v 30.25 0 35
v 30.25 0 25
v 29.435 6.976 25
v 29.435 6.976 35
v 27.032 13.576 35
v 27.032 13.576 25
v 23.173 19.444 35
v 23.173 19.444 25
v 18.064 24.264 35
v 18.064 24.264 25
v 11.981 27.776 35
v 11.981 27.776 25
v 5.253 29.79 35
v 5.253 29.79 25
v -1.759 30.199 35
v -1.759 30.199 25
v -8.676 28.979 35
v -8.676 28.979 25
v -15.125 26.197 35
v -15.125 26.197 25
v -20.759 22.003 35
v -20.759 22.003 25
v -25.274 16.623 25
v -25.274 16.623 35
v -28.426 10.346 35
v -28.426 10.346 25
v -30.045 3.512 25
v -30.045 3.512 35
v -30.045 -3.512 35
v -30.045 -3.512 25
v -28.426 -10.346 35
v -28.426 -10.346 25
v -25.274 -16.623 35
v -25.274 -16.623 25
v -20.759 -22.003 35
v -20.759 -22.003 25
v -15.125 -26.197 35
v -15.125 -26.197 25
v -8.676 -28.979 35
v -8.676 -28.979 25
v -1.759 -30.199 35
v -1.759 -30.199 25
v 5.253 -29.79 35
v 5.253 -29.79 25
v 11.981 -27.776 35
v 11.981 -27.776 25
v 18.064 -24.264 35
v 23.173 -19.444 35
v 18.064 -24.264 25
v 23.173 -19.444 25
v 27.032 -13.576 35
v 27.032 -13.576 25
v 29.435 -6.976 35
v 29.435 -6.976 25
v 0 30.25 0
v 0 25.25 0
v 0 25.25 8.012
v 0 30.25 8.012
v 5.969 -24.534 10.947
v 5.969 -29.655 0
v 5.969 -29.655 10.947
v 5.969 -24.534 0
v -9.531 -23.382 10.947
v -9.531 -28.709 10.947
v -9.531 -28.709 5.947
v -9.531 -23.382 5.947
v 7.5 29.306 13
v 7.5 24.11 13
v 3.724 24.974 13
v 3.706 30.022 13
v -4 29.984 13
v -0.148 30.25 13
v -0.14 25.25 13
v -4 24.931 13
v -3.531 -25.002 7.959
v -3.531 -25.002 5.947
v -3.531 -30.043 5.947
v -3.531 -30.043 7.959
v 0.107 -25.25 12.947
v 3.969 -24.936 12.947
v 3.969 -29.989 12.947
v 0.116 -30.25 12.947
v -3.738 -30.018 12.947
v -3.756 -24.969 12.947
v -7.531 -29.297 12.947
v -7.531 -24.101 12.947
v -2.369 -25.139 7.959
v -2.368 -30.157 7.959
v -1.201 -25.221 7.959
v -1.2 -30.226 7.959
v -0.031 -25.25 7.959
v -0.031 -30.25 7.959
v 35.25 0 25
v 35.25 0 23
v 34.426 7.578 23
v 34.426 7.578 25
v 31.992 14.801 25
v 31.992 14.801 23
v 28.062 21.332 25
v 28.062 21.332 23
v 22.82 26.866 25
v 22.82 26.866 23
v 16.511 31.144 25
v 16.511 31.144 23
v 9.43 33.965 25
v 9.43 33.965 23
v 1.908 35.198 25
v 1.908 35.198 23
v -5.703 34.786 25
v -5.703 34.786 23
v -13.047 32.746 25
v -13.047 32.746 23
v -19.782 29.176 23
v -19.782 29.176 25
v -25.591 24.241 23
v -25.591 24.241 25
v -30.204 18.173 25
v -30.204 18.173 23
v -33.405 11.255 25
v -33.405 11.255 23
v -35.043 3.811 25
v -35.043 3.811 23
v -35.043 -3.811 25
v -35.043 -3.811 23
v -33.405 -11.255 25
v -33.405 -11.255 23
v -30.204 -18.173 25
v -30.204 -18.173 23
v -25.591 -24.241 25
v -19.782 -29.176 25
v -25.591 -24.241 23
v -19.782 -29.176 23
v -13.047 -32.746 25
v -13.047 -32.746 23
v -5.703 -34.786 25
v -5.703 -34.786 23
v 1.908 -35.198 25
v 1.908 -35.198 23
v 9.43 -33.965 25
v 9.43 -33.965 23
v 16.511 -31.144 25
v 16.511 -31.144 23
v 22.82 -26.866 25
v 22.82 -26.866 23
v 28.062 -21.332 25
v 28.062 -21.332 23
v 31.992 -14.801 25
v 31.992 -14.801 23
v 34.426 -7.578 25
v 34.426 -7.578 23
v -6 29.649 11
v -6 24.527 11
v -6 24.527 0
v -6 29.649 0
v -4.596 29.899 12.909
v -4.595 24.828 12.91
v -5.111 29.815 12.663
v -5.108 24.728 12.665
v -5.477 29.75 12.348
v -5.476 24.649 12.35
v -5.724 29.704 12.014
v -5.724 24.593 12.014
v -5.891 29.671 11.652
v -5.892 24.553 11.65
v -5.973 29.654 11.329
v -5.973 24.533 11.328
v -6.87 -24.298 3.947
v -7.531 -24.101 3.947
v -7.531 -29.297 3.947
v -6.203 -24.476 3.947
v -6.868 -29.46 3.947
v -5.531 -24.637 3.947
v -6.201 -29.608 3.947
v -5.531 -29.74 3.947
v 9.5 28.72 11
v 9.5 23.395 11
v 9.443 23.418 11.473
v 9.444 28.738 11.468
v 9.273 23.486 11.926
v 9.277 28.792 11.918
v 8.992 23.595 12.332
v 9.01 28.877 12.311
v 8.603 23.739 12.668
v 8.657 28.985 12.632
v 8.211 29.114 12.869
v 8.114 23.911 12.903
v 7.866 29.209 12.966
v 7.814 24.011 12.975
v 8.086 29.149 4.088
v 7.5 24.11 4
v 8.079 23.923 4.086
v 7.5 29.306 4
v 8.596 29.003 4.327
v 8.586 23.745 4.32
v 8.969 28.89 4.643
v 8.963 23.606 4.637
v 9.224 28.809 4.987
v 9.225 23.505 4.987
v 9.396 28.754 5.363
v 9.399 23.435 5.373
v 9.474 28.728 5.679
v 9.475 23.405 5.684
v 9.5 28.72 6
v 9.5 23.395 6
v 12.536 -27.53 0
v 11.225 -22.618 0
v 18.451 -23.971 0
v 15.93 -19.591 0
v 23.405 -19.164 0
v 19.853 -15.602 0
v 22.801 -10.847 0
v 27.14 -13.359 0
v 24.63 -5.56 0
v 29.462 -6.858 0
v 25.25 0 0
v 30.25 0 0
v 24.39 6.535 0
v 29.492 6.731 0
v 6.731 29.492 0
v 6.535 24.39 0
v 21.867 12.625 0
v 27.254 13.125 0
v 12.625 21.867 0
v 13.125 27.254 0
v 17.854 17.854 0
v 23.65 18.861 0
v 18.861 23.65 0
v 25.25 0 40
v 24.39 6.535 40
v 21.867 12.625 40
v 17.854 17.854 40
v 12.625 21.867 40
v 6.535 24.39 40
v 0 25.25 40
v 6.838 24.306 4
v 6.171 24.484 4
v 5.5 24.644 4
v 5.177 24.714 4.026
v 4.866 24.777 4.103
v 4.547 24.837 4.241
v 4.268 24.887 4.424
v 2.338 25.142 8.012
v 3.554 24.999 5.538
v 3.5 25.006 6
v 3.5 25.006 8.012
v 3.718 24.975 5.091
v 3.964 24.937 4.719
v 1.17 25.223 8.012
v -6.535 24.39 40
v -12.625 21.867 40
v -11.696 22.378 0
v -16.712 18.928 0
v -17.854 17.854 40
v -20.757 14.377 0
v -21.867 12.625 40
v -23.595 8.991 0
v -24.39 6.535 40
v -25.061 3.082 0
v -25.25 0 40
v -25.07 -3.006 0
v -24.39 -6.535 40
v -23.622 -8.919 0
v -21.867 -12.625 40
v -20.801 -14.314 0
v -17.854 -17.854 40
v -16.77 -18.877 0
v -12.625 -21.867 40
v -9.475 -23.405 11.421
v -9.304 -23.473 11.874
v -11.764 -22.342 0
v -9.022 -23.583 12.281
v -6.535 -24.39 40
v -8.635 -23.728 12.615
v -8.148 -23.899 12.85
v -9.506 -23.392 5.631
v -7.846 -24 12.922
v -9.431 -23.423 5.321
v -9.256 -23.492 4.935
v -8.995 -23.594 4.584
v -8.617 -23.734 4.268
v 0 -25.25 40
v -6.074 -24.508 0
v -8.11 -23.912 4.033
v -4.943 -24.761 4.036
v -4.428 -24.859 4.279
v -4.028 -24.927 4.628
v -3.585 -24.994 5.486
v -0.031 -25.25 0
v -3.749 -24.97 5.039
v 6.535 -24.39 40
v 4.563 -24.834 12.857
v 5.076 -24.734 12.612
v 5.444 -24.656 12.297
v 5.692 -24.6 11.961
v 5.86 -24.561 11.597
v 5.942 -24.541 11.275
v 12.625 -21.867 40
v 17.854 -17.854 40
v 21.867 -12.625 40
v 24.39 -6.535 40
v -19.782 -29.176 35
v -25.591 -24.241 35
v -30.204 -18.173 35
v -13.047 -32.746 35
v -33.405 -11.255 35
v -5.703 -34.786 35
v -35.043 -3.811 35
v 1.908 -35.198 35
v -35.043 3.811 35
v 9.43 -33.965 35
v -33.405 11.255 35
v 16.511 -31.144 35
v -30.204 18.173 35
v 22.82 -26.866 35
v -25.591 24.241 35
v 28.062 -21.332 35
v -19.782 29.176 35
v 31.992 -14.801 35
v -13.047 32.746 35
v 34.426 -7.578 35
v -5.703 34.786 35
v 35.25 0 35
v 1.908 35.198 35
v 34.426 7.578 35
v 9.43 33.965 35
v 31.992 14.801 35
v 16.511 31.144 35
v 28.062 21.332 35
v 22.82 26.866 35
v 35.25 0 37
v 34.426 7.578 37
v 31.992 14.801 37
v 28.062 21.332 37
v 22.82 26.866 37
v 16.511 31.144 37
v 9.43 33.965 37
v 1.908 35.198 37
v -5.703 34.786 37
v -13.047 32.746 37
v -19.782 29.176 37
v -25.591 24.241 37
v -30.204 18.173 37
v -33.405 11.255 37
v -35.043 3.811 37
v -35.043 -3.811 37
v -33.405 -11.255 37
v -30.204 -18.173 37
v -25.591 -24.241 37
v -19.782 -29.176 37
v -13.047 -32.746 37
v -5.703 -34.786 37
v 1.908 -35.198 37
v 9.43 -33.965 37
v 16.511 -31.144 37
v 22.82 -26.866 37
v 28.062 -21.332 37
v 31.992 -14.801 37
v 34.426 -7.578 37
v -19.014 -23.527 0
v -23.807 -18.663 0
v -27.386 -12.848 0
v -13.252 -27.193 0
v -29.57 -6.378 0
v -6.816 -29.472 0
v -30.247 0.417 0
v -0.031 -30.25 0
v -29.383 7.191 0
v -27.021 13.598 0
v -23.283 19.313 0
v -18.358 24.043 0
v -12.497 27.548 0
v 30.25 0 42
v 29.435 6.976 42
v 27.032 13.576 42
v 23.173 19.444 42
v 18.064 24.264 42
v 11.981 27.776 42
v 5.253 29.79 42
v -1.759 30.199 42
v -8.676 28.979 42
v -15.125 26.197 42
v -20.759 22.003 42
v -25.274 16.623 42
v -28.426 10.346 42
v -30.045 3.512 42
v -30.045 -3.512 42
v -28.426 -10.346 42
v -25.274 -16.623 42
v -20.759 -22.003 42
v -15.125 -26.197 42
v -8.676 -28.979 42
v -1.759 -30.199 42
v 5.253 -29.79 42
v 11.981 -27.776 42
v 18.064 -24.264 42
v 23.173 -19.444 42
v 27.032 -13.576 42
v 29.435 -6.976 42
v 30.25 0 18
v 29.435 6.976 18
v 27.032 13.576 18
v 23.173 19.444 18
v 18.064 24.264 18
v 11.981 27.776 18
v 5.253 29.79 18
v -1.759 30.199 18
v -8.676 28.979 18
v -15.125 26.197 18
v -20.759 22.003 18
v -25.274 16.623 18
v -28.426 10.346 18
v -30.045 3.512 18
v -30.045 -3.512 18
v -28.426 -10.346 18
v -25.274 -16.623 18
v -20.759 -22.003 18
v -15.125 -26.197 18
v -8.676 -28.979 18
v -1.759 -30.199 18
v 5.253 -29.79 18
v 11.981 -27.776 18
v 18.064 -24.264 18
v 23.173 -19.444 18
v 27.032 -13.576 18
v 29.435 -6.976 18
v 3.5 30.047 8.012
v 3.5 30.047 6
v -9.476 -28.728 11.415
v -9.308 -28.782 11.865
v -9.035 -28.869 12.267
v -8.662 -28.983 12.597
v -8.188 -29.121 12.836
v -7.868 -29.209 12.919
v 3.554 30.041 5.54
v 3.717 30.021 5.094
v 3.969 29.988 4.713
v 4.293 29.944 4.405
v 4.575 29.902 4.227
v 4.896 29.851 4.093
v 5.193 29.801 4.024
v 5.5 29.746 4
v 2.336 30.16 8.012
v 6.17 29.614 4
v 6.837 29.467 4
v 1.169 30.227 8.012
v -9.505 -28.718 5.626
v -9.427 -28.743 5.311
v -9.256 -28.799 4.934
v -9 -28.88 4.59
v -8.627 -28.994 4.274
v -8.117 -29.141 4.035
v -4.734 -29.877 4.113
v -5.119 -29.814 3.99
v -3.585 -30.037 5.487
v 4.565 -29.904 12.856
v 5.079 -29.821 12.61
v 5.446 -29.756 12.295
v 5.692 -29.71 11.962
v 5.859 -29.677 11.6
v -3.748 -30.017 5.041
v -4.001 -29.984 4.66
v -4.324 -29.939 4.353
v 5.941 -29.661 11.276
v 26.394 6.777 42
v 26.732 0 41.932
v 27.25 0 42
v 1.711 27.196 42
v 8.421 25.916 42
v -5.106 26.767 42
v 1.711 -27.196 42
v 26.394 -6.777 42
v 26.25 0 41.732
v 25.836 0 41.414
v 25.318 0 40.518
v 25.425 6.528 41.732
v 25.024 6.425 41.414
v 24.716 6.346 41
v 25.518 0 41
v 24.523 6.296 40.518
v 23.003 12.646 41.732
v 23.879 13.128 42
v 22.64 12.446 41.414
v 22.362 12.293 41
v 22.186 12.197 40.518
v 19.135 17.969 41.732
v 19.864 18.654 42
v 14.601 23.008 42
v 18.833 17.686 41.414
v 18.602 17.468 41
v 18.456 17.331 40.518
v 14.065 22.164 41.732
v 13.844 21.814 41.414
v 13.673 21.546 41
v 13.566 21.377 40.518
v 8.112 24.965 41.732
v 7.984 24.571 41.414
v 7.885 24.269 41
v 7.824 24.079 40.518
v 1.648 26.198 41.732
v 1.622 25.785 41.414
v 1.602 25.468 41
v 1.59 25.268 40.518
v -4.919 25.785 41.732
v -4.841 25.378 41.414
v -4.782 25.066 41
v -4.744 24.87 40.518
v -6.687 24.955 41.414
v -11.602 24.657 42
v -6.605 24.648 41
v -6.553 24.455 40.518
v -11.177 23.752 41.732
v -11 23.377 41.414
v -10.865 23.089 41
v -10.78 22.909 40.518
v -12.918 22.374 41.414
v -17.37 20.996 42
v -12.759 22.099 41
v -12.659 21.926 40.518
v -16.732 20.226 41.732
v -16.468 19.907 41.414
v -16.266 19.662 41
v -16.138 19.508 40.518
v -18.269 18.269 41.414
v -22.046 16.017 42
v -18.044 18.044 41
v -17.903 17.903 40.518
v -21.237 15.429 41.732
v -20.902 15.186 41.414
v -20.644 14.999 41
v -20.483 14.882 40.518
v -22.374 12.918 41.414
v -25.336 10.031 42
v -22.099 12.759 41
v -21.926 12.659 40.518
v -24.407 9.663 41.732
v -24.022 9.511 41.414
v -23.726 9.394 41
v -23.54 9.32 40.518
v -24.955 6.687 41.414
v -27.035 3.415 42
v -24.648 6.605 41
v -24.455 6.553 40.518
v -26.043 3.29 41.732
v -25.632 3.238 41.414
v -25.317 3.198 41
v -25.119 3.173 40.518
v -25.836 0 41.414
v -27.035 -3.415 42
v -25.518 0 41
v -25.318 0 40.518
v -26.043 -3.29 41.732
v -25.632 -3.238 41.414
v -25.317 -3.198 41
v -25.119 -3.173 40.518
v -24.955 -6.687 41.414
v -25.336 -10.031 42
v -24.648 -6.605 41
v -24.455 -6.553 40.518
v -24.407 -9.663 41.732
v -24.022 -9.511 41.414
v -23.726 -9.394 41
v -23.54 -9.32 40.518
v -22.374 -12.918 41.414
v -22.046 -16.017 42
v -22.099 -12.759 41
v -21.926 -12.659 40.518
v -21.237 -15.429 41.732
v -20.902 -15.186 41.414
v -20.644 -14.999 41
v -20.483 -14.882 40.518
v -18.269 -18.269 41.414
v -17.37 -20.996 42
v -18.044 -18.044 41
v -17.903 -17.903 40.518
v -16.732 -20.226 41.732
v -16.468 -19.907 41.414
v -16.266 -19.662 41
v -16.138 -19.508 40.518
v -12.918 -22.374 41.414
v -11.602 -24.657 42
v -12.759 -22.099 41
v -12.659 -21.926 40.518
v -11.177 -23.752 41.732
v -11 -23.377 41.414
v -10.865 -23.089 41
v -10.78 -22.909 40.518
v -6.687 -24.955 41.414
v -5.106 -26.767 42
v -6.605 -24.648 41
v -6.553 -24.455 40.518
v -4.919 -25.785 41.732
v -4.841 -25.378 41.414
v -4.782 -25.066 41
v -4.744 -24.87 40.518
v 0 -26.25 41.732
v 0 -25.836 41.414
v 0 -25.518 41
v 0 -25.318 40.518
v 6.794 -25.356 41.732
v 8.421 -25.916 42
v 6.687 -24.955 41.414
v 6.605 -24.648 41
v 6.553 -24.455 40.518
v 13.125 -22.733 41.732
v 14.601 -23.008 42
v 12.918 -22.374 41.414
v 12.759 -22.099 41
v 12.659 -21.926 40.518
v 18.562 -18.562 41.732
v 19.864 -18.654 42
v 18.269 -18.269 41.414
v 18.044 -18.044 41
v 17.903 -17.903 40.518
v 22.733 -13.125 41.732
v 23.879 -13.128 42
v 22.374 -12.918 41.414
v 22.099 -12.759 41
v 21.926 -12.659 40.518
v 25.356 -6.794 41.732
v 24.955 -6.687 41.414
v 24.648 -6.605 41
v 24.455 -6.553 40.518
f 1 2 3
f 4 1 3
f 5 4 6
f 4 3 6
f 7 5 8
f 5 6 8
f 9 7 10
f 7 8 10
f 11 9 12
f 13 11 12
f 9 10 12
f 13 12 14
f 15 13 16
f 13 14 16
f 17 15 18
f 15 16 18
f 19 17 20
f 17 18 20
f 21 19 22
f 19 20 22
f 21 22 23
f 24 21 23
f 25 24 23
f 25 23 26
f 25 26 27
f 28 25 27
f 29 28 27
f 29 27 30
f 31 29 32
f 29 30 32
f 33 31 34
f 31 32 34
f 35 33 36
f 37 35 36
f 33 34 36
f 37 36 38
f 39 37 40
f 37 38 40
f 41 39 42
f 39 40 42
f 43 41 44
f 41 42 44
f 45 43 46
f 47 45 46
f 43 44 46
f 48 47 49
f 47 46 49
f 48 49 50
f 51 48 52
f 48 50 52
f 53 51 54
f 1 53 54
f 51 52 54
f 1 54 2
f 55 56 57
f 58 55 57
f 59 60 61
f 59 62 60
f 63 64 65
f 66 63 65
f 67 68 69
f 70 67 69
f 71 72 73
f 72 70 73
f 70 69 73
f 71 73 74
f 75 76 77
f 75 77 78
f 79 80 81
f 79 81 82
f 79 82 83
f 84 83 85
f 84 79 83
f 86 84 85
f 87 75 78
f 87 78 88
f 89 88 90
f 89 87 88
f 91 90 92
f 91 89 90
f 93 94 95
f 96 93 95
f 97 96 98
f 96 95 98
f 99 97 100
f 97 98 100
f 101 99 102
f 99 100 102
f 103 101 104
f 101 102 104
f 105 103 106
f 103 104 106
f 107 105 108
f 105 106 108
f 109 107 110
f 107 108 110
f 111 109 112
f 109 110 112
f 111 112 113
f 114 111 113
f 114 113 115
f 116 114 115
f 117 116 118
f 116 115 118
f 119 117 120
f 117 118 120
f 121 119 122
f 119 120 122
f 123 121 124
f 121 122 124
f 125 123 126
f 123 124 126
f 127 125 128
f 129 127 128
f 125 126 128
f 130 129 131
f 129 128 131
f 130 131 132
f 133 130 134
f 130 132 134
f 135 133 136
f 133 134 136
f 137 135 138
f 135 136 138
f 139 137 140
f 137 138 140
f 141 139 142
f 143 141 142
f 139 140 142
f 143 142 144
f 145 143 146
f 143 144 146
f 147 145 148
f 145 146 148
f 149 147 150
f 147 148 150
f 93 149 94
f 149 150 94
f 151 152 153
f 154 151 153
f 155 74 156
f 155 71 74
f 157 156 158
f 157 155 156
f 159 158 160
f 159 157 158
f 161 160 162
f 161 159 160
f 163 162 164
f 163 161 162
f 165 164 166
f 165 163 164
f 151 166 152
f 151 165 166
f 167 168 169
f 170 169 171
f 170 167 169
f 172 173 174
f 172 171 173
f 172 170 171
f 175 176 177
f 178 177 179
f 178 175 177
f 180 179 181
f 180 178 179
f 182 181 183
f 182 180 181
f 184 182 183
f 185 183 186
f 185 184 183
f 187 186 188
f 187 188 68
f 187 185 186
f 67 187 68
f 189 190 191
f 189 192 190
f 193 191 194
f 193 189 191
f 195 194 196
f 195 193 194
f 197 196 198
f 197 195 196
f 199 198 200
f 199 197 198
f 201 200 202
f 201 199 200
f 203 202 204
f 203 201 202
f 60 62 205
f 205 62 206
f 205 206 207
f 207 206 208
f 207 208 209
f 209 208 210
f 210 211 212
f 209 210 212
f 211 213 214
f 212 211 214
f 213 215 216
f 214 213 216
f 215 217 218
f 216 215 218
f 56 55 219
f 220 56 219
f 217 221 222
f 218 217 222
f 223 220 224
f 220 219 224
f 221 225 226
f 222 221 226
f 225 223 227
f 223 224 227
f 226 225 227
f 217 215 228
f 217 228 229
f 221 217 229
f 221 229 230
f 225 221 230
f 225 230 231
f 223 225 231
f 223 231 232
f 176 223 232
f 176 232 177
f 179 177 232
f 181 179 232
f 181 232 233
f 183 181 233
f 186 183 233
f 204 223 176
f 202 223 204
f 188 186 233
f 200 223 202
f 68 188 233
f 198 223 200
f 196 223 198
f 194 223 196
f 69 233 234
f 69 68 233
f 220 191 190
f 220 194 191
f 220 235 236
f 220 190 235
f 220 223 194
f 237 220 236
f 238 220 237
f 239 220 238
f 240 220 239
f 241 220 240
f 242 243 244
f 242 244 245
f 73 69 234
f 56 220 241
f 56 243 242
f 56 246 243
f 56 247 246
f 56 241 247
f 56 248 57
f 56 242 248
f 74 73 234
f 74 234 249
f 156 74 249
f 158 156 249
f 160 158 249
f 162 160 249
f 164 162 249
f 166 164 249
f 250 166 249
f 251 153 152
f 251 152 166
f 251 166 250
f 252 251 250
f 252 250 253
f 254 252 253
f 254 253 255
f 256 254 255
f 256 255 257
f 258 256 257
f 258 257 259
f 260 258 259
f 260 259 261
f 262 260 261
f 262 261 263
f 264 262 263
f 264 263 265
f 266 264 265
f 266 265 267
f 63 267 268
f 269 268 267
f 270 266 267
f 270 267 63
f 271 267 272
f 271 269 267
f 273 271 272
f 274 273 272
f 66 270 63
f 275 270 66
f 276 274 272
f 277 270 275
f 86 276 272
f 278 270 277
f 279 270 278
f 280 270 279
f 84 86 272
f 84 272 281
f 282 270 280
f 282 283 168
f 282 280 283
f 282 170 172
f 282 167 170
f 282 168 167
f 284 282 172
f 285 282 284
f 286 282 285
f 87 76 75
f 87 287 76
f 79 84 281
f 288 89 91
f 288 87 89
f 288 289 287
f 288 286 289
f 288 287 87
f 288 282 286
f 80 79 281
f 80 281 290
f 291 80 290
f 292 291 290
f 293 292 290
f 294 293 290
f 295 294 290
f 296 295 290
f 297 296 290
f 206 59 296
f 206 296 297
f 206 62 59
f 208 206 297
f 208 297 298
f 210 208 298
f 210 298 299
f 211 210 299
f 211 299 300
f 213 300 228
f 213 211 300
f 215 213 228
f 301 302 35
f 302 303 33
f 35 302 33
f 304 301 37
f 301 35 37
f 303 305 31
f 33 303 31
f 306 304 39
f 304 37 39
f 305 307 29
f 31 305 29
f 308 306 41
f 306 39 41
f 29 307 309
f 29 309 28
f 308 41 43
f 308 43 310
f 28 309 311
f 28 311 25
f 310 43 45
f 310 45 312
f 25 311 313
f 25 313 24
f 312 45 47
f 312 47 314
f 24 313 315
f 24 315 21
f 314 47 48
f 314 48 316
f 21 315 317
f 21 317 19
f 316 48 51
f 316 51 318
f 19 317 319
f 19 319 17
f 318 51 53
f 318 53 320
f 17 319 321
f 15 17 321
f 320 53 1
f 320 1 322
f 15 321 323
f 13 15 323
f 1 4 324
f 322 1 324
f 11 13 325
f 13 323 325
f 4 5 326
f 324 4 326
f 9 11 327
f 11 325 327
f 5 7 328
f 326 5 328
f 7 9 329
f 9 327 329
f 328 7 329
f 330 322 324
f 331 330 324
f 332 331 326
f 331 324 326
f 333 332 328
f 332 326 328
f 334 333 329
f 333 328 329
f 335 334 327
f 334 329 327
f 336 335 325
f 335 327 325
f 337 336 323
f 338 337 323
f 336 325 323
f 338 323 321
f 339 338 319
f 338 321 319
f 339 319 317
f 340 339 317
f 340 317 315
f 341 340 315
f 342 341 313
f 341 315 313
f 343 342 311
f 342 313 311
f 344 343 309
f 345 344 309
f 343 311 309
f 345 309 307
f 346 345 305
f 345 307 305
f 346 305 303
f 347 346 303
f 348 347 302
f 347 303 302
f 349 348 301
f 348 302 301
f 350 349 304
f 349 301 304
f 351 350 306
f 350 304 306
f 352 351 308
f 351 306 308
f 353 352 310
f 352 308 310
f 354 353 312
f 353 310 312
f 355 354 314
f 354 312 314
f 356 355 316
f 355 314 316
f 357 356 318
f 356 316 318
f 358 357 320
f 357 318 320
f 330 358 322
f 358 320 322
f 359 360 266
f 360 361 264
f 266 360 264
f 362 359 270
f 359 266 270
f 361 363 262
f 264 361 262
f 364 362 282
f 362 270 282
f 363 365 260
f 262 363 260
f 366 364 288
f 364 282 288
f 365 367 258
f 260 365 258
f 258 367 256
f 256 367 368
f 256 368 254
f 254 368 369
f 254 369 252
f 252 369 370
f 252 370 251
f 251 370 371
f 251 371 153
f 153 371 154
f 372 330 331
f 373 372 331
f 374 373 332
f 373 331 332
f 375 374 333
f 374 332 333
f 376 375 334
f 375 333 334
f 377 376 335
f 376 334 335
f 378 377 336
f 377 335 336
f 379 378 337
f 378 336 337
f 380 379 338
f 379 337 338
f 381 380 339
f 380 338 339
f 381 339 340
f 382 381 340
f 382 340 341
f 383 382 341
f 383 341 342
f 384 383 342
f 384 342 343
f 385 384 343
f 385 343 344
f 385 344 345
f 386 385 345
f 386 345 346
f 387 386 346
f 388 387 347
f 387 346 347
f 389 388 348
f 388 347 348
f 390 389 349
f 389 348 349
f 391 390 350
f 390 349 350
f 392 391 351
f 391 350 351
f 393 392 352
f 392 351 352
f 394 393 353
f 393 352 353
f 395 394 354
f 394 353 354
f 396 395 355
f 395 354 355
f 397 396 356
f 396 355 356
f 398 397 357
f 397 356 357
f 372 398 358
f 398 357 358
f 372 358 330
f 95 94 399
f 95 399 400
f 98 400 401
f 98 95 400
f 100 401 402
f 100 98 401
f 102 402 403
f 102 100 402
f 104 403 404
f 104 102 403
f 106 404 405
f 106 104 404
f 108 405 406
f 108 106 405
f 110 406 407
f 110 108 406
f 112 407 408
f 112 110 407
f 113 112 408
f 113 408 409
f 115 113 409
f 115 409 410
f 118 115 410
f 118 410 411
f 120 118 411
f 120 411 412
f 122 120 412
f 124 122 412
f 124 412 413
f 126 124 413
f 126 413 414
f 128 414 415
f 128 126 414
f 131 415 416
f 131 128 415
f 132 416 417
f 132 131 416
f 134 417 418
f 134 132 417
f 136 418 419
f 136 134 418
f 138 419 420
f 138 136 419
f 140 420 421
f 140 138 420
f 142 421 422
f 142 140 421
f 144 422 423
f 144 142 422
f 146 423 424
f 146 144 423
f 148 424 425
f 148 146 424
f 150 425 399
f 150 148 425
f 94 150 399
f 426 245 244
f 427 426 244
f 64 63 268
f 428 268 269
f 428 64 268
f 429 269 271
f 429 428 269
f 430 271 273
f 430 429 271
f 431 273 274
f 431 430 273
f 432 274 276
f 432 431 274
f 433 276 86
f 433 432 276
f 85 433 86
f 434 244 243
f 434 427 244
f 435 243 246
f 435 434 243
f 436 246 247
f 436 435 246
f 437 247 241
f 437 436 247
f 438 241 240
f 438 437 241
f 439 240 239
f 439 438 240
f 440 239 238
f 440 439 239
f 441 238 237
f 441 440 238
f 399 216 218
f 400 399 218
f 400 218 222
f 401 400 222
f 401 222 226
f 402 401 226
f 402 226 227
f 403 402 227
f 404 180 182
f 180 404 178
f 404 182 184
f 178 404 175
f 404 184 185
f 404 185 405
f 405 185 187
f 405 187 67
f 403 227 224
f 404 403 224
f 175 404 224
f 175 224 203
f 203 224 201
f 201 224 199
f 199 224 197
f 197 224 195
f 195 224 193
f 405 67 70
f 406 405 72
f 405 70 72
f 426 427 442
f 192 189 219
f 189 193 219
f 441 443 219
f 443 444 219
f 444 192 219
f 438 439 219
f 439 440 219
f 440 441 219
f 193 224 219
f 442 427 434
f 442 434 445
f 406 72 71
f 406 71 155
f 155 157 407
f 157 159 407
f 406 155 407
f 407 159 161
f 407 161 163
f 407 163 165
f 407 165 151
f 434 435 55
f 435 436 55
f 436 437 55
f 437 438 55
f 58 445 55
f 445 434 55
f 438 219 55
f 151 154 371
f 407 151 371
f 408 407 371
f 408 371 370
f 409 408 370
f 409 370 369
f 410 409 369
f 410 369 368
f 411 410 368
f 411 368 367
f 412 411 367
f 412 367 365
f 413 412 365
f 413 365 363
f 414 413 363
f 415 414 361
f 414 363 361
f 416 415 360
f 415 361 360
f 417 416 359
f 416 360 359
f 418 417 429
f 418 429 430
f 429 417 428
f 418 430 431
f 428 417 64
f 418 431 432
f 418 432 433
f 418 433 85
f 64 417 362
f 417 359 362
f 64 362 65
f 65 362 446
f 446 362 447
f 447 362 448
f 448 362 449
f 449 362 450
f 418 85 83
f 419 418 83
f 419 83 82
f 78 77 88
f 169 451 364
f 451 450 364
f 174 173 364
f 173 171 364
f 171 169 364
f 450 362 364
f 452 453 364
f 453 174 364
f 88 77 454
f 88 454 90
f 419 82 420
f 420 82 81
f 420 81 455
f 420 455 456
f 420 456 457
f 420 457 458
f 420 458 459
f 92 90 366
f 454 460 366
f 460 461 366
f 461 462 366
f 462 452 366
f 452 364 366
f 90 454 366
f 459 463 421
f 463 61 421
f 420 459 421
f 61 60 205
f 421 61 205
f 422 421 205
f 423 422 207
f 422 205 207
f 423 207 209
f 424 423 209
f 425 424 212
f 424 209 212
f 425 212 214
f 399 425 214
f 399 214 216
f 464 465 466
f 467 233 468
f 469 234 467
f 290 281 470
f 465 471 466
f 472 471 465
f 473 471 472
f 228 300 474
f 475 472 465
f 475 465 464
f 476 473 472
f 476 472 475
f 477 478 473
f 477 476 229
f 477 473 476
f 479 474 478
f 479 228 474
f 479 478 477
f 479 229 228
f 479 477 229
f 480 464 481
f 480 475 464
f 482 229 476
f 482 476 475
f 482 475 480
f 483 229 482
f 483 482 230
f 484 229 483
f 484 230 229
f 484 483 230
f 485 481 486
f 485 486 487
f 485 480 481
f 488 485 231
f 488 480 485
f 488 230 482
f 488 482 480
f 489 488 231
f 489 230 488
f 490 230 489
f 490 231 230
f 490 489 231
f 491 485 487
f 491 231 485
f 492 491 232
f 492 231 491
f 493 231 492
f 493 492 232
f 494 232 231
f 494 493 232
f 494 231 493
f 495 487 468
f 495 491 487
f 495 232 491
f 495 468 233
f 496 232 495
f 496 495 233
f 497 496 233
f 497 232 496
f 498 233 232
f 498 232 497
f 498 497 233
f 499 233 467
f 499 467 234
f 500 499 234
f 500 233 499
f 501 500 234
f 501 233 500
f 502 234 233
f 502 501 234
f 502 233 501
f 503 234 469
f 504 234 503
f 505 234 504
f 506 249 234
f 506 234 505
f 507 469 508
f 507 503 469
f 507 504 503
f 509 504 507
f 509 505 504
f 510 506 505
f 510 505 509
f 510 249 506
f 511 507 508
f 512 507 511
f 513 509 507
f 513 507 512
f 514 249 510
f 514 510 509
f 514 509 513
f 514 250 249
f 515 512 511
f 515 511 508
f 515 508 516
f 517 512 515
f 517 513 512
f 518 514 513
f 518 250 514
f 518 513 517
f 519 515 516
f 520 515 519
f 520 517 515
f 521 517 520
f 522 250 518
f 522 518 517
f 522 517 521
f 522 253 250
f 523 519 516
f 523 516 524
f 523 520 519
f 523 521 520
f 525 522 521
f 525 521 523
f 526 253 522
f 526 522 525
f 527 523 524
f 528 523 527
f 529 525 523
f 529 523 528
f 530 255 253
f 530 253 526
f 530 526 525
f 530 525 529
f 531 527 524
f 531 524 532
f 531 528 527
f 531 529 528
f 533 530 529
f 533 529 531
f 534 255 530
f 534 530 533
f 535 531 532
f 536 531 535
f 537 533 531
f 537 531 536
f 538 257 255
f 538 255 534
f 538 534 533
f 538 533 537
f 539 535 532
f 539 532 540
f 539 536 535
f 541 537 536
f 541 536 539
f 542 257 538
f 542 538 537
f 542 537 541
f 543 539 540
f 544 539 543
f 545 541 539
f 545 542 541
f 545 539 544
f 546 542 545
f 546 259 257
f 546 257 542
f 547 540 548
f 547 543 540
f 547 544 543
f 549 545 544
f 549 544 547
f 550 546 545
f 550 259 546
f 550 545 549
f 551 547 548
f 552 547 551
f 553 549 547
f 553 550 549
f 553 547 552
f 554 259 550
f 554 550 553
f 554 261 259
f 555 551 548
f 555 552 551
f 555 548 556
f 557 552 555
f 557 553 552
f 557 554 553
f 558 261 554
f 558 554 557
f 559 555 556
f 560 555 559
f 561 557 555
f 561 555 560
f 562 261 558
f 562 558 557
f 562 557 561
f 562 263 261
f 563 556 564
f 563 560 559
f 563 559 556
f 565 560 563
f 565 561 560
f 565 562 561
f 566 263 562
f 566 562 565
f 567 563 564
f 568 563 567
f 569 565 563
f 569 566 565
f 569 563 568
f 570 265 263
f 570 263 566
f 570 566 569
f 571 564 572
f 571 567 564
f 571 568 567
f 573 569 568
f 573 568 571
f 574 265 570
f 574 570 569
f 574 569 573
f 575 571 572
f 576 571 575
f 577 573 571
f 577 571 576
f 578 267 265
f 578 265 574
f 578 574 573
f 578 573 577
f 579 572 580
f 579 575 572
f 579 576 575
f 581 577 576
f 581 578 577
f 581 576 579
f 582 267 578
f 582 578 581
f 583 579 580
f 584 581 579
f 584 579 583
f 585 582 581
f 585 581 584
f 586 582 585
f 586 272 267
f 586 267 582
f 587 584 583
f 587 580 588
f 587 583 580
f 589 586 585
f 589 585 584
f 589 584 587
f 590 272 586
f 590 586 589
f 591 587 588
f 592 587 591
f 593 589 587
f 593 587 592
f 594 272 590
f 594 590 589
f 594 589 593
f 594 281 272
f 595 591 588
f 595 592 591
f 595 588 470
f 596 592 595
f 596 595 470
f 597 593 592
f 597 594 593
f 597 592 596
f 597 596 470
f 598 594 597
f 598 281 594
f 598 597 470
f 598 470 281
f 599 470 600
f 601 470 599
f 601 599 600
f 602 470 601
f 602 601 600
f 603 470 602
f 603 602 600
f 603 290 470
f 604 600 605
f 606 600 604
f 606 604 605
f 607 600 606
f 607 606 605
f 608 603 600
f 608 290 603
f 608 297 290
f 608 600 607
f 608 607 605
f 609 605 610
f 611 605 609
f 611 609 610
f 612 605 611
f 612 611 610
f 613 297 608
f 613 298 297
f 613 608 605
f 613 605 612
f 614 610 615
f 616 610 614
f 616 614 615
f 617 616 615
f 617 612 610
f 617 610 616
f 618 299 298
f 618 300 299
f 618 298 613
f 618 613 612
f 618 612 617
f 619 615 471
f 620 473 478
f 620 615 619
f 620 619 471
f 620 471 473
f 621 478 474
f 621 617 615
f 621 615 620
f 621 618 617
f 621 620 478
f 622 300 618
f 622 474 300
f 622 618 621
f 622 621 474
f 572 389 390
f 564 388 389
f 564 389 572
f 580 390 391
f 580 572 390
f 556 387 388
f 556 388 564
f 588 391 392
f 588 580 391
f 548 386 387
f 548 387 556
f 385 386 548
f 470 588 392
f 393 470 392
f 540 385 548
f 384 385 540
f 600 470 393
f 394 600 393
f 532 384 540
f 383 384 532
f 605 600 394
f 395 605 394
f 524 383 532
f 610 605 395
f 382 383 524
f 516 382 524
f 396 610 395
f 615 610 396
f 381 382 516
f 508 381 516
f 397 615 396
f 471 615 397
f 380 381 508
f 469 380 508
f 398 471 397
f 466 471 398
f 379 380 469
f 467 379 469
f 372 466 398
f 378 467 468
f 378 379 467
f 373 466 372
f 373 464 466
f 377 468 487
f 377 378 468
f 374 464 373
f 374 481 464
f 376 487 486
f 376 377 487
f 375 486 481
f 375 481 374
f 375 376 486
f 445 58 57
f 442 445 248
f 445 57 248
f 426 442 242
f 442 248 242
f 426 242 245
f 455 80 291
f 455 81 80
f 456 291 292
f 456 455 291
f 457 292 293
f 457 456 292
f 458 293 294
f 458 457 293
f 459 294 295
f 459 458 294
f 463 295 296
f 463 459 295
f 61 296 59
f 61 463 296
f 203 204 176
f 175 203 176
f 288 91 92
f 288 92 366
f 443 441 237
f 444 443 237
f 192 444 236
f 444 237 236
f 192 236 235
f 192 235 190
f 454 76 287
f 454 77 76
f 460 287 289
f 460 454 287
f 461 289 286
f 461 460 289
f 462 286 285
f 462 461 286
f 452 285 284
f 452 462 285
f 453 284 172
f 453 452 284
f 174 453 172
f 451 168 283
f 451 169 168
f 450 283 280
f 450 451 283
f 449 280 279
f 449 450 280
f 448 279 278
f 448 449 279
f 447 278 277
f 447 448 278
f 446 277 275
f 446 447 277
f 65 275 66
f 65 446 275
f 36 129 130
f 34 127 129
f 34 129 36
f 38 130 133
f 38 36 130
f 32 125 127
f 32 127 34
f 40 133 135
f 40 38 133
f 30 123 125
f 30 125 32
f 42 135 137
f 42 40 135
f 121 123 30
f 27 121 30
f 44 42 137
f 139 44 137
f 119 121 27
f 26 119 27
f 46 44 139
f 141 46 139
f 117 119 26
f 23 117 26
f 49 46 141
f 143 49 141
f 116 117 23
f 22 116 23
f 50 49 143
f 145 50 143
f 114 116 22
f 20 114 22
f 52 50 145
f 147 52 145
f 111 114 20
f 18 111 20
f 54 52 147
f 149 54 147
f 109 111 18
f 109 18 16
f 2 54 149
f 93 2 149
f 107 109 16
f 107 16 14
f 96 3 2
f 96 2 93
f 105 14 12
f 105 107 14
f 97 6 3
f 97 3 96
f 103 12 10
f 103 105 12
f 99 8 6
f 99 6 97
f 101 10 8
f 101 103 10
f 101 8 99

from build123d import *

# Parameters (mm, degrees)
F0_R      = 30.25
F0_R_2    = 25.25
F1_DEPTH  = 18
F2_R      = 35.25
F2_R_2    = 30.25
F2_R_3    = 25.25
F3_DEPTH  = 7
F4_R      = 30.25
F4_R_2    = 25.25
F5_DEPTH  = 10
F6_R      = 35.25
F6_R_2    = 30.25
F6_R_3    = 25.25
F7_DEPTH  = 7
F8_R      = 2
F10_DEPTH = 50
F11_R     = 2
F13_DEPTH = 50
F14_R     = 2
F15_SIZE2 = 4.99999
F15_SIZE  = 4.99999


# Not quite as in the source:
# - a fillet or chamfer is up to 0.001 mm smaller than in the source, because OpenCascade refuses the exact size


with BuildPart() as f1:
    # F0 (on Top) → F1 (new body)
    with BuildSketch(Plane.XY):
        Circle(F0_R)
        Circle(F0_R_2, mode=Mode.SUBTRACT)
    extrude(amount=F1_DEPTH)

    # F2 (on face) → F3 (join)
    with BuildSketch(Plane.XY.offset(18)):
        Circle(F2_R)
        Circle(F2_R_2, mode=Mode.SUBTRACT)
        Circle(F2_R_2)
        Circle(F2_R_3, mode=Mode.SUBTRACT)
    extrude(amount=F3_DEPTH)

    # F4 (on face) → F5 (join)
    with BuildSketch(Plane.XY.offset(25)):
        Circle(F4_R)
        Circle(F4_R_2, mode=Mode.SUBTRACT)
    extrude(amount=F5_DEPTH)

    # F6 (on face) → F7 (join)
    with BuildSketch(Plane.XY.offset(35)):
        Circle(F6_R)
        Circle(F6_R_2, mode=Mode.SUBTRACT)
        Circle(F6_R_2)
        Circle(F6_R_3, mode=Mode.SUBTRACT)
    extrude(amount=F7_DEPTH)

    # F8
    f8_edges = [f1.edges().sort_by_distance(p)[0] for p in [
        (-25.25, 0, 42),
    ]]
    fillet(f8_edges, radius=F8_R)

    # F9 (on Front) → F10 (cut)
    with BuildSketch(Plane.XZ):
        Polygon((-6, 0), (0, 0), (0, 8.0120034479), (3.5, 8.0120034479), (3.5, 4), (9.5, 4), (9.5, 13), (-6, 13), align=None)
    extrude(amount=-F10_DEPTH, mode=Mode.SUBTRACT)

    # F11
    f11_edges = [f1.edges().sort_by_distance(p)[0] for p in [
        (9.5, 26.05713, 13),
        (-6, 27.08788, 13),
        (3.5, 27.526544, 4),
        (9.5, 26.05713, 4),
    ]]
    fillet(f11_edges, radius=F11_R)

    # F12 (on Front) → F13 (cut)
    with BuildSketch(Plane.XZ):
        Polygon((-0.0314122736, -0.0527559742), (5.9685877264, -0.0527559742), (5.9685877264, 12.9472440258), (-9.5314122736, 12.9472440258), (-9.5314122736, 3.9472440258), (-3.5314122736, 3.9472440258), (-3.5314122736, 7.9592474737), (-0.0314122736, 7.9592474737), align=None)
    extrude(amount=F13_DEPTH, mode=Mode.SUBTRACT)

    # F14
    f14_edges = [f1.edges().sort_by_distance(p)[0] for p in [
        (-9.531412, -26.045535, 12.947244),
        (-9.531412, -26.045535, 3.947244),
        (-3.531412, -27.522498, 3.947244),
        (5.968588, -27.094881, 12.947244),
    ]]
    fillet(f14_edges, radius=F14_R)

    # F15 (size 5 and 5 in the source; OpenCascade refuses exactly that, so slightly less here)
    f15_edges = [f1.edges().sort_by_distance(p)[0] for p in [
        (-35.25, 0, 18),
        (-35.25, 0, 42),
    ]]
    chamfer(f15_edges, length=F15_SIZE, length2=F15_SIZE2)


solid = f1.part
